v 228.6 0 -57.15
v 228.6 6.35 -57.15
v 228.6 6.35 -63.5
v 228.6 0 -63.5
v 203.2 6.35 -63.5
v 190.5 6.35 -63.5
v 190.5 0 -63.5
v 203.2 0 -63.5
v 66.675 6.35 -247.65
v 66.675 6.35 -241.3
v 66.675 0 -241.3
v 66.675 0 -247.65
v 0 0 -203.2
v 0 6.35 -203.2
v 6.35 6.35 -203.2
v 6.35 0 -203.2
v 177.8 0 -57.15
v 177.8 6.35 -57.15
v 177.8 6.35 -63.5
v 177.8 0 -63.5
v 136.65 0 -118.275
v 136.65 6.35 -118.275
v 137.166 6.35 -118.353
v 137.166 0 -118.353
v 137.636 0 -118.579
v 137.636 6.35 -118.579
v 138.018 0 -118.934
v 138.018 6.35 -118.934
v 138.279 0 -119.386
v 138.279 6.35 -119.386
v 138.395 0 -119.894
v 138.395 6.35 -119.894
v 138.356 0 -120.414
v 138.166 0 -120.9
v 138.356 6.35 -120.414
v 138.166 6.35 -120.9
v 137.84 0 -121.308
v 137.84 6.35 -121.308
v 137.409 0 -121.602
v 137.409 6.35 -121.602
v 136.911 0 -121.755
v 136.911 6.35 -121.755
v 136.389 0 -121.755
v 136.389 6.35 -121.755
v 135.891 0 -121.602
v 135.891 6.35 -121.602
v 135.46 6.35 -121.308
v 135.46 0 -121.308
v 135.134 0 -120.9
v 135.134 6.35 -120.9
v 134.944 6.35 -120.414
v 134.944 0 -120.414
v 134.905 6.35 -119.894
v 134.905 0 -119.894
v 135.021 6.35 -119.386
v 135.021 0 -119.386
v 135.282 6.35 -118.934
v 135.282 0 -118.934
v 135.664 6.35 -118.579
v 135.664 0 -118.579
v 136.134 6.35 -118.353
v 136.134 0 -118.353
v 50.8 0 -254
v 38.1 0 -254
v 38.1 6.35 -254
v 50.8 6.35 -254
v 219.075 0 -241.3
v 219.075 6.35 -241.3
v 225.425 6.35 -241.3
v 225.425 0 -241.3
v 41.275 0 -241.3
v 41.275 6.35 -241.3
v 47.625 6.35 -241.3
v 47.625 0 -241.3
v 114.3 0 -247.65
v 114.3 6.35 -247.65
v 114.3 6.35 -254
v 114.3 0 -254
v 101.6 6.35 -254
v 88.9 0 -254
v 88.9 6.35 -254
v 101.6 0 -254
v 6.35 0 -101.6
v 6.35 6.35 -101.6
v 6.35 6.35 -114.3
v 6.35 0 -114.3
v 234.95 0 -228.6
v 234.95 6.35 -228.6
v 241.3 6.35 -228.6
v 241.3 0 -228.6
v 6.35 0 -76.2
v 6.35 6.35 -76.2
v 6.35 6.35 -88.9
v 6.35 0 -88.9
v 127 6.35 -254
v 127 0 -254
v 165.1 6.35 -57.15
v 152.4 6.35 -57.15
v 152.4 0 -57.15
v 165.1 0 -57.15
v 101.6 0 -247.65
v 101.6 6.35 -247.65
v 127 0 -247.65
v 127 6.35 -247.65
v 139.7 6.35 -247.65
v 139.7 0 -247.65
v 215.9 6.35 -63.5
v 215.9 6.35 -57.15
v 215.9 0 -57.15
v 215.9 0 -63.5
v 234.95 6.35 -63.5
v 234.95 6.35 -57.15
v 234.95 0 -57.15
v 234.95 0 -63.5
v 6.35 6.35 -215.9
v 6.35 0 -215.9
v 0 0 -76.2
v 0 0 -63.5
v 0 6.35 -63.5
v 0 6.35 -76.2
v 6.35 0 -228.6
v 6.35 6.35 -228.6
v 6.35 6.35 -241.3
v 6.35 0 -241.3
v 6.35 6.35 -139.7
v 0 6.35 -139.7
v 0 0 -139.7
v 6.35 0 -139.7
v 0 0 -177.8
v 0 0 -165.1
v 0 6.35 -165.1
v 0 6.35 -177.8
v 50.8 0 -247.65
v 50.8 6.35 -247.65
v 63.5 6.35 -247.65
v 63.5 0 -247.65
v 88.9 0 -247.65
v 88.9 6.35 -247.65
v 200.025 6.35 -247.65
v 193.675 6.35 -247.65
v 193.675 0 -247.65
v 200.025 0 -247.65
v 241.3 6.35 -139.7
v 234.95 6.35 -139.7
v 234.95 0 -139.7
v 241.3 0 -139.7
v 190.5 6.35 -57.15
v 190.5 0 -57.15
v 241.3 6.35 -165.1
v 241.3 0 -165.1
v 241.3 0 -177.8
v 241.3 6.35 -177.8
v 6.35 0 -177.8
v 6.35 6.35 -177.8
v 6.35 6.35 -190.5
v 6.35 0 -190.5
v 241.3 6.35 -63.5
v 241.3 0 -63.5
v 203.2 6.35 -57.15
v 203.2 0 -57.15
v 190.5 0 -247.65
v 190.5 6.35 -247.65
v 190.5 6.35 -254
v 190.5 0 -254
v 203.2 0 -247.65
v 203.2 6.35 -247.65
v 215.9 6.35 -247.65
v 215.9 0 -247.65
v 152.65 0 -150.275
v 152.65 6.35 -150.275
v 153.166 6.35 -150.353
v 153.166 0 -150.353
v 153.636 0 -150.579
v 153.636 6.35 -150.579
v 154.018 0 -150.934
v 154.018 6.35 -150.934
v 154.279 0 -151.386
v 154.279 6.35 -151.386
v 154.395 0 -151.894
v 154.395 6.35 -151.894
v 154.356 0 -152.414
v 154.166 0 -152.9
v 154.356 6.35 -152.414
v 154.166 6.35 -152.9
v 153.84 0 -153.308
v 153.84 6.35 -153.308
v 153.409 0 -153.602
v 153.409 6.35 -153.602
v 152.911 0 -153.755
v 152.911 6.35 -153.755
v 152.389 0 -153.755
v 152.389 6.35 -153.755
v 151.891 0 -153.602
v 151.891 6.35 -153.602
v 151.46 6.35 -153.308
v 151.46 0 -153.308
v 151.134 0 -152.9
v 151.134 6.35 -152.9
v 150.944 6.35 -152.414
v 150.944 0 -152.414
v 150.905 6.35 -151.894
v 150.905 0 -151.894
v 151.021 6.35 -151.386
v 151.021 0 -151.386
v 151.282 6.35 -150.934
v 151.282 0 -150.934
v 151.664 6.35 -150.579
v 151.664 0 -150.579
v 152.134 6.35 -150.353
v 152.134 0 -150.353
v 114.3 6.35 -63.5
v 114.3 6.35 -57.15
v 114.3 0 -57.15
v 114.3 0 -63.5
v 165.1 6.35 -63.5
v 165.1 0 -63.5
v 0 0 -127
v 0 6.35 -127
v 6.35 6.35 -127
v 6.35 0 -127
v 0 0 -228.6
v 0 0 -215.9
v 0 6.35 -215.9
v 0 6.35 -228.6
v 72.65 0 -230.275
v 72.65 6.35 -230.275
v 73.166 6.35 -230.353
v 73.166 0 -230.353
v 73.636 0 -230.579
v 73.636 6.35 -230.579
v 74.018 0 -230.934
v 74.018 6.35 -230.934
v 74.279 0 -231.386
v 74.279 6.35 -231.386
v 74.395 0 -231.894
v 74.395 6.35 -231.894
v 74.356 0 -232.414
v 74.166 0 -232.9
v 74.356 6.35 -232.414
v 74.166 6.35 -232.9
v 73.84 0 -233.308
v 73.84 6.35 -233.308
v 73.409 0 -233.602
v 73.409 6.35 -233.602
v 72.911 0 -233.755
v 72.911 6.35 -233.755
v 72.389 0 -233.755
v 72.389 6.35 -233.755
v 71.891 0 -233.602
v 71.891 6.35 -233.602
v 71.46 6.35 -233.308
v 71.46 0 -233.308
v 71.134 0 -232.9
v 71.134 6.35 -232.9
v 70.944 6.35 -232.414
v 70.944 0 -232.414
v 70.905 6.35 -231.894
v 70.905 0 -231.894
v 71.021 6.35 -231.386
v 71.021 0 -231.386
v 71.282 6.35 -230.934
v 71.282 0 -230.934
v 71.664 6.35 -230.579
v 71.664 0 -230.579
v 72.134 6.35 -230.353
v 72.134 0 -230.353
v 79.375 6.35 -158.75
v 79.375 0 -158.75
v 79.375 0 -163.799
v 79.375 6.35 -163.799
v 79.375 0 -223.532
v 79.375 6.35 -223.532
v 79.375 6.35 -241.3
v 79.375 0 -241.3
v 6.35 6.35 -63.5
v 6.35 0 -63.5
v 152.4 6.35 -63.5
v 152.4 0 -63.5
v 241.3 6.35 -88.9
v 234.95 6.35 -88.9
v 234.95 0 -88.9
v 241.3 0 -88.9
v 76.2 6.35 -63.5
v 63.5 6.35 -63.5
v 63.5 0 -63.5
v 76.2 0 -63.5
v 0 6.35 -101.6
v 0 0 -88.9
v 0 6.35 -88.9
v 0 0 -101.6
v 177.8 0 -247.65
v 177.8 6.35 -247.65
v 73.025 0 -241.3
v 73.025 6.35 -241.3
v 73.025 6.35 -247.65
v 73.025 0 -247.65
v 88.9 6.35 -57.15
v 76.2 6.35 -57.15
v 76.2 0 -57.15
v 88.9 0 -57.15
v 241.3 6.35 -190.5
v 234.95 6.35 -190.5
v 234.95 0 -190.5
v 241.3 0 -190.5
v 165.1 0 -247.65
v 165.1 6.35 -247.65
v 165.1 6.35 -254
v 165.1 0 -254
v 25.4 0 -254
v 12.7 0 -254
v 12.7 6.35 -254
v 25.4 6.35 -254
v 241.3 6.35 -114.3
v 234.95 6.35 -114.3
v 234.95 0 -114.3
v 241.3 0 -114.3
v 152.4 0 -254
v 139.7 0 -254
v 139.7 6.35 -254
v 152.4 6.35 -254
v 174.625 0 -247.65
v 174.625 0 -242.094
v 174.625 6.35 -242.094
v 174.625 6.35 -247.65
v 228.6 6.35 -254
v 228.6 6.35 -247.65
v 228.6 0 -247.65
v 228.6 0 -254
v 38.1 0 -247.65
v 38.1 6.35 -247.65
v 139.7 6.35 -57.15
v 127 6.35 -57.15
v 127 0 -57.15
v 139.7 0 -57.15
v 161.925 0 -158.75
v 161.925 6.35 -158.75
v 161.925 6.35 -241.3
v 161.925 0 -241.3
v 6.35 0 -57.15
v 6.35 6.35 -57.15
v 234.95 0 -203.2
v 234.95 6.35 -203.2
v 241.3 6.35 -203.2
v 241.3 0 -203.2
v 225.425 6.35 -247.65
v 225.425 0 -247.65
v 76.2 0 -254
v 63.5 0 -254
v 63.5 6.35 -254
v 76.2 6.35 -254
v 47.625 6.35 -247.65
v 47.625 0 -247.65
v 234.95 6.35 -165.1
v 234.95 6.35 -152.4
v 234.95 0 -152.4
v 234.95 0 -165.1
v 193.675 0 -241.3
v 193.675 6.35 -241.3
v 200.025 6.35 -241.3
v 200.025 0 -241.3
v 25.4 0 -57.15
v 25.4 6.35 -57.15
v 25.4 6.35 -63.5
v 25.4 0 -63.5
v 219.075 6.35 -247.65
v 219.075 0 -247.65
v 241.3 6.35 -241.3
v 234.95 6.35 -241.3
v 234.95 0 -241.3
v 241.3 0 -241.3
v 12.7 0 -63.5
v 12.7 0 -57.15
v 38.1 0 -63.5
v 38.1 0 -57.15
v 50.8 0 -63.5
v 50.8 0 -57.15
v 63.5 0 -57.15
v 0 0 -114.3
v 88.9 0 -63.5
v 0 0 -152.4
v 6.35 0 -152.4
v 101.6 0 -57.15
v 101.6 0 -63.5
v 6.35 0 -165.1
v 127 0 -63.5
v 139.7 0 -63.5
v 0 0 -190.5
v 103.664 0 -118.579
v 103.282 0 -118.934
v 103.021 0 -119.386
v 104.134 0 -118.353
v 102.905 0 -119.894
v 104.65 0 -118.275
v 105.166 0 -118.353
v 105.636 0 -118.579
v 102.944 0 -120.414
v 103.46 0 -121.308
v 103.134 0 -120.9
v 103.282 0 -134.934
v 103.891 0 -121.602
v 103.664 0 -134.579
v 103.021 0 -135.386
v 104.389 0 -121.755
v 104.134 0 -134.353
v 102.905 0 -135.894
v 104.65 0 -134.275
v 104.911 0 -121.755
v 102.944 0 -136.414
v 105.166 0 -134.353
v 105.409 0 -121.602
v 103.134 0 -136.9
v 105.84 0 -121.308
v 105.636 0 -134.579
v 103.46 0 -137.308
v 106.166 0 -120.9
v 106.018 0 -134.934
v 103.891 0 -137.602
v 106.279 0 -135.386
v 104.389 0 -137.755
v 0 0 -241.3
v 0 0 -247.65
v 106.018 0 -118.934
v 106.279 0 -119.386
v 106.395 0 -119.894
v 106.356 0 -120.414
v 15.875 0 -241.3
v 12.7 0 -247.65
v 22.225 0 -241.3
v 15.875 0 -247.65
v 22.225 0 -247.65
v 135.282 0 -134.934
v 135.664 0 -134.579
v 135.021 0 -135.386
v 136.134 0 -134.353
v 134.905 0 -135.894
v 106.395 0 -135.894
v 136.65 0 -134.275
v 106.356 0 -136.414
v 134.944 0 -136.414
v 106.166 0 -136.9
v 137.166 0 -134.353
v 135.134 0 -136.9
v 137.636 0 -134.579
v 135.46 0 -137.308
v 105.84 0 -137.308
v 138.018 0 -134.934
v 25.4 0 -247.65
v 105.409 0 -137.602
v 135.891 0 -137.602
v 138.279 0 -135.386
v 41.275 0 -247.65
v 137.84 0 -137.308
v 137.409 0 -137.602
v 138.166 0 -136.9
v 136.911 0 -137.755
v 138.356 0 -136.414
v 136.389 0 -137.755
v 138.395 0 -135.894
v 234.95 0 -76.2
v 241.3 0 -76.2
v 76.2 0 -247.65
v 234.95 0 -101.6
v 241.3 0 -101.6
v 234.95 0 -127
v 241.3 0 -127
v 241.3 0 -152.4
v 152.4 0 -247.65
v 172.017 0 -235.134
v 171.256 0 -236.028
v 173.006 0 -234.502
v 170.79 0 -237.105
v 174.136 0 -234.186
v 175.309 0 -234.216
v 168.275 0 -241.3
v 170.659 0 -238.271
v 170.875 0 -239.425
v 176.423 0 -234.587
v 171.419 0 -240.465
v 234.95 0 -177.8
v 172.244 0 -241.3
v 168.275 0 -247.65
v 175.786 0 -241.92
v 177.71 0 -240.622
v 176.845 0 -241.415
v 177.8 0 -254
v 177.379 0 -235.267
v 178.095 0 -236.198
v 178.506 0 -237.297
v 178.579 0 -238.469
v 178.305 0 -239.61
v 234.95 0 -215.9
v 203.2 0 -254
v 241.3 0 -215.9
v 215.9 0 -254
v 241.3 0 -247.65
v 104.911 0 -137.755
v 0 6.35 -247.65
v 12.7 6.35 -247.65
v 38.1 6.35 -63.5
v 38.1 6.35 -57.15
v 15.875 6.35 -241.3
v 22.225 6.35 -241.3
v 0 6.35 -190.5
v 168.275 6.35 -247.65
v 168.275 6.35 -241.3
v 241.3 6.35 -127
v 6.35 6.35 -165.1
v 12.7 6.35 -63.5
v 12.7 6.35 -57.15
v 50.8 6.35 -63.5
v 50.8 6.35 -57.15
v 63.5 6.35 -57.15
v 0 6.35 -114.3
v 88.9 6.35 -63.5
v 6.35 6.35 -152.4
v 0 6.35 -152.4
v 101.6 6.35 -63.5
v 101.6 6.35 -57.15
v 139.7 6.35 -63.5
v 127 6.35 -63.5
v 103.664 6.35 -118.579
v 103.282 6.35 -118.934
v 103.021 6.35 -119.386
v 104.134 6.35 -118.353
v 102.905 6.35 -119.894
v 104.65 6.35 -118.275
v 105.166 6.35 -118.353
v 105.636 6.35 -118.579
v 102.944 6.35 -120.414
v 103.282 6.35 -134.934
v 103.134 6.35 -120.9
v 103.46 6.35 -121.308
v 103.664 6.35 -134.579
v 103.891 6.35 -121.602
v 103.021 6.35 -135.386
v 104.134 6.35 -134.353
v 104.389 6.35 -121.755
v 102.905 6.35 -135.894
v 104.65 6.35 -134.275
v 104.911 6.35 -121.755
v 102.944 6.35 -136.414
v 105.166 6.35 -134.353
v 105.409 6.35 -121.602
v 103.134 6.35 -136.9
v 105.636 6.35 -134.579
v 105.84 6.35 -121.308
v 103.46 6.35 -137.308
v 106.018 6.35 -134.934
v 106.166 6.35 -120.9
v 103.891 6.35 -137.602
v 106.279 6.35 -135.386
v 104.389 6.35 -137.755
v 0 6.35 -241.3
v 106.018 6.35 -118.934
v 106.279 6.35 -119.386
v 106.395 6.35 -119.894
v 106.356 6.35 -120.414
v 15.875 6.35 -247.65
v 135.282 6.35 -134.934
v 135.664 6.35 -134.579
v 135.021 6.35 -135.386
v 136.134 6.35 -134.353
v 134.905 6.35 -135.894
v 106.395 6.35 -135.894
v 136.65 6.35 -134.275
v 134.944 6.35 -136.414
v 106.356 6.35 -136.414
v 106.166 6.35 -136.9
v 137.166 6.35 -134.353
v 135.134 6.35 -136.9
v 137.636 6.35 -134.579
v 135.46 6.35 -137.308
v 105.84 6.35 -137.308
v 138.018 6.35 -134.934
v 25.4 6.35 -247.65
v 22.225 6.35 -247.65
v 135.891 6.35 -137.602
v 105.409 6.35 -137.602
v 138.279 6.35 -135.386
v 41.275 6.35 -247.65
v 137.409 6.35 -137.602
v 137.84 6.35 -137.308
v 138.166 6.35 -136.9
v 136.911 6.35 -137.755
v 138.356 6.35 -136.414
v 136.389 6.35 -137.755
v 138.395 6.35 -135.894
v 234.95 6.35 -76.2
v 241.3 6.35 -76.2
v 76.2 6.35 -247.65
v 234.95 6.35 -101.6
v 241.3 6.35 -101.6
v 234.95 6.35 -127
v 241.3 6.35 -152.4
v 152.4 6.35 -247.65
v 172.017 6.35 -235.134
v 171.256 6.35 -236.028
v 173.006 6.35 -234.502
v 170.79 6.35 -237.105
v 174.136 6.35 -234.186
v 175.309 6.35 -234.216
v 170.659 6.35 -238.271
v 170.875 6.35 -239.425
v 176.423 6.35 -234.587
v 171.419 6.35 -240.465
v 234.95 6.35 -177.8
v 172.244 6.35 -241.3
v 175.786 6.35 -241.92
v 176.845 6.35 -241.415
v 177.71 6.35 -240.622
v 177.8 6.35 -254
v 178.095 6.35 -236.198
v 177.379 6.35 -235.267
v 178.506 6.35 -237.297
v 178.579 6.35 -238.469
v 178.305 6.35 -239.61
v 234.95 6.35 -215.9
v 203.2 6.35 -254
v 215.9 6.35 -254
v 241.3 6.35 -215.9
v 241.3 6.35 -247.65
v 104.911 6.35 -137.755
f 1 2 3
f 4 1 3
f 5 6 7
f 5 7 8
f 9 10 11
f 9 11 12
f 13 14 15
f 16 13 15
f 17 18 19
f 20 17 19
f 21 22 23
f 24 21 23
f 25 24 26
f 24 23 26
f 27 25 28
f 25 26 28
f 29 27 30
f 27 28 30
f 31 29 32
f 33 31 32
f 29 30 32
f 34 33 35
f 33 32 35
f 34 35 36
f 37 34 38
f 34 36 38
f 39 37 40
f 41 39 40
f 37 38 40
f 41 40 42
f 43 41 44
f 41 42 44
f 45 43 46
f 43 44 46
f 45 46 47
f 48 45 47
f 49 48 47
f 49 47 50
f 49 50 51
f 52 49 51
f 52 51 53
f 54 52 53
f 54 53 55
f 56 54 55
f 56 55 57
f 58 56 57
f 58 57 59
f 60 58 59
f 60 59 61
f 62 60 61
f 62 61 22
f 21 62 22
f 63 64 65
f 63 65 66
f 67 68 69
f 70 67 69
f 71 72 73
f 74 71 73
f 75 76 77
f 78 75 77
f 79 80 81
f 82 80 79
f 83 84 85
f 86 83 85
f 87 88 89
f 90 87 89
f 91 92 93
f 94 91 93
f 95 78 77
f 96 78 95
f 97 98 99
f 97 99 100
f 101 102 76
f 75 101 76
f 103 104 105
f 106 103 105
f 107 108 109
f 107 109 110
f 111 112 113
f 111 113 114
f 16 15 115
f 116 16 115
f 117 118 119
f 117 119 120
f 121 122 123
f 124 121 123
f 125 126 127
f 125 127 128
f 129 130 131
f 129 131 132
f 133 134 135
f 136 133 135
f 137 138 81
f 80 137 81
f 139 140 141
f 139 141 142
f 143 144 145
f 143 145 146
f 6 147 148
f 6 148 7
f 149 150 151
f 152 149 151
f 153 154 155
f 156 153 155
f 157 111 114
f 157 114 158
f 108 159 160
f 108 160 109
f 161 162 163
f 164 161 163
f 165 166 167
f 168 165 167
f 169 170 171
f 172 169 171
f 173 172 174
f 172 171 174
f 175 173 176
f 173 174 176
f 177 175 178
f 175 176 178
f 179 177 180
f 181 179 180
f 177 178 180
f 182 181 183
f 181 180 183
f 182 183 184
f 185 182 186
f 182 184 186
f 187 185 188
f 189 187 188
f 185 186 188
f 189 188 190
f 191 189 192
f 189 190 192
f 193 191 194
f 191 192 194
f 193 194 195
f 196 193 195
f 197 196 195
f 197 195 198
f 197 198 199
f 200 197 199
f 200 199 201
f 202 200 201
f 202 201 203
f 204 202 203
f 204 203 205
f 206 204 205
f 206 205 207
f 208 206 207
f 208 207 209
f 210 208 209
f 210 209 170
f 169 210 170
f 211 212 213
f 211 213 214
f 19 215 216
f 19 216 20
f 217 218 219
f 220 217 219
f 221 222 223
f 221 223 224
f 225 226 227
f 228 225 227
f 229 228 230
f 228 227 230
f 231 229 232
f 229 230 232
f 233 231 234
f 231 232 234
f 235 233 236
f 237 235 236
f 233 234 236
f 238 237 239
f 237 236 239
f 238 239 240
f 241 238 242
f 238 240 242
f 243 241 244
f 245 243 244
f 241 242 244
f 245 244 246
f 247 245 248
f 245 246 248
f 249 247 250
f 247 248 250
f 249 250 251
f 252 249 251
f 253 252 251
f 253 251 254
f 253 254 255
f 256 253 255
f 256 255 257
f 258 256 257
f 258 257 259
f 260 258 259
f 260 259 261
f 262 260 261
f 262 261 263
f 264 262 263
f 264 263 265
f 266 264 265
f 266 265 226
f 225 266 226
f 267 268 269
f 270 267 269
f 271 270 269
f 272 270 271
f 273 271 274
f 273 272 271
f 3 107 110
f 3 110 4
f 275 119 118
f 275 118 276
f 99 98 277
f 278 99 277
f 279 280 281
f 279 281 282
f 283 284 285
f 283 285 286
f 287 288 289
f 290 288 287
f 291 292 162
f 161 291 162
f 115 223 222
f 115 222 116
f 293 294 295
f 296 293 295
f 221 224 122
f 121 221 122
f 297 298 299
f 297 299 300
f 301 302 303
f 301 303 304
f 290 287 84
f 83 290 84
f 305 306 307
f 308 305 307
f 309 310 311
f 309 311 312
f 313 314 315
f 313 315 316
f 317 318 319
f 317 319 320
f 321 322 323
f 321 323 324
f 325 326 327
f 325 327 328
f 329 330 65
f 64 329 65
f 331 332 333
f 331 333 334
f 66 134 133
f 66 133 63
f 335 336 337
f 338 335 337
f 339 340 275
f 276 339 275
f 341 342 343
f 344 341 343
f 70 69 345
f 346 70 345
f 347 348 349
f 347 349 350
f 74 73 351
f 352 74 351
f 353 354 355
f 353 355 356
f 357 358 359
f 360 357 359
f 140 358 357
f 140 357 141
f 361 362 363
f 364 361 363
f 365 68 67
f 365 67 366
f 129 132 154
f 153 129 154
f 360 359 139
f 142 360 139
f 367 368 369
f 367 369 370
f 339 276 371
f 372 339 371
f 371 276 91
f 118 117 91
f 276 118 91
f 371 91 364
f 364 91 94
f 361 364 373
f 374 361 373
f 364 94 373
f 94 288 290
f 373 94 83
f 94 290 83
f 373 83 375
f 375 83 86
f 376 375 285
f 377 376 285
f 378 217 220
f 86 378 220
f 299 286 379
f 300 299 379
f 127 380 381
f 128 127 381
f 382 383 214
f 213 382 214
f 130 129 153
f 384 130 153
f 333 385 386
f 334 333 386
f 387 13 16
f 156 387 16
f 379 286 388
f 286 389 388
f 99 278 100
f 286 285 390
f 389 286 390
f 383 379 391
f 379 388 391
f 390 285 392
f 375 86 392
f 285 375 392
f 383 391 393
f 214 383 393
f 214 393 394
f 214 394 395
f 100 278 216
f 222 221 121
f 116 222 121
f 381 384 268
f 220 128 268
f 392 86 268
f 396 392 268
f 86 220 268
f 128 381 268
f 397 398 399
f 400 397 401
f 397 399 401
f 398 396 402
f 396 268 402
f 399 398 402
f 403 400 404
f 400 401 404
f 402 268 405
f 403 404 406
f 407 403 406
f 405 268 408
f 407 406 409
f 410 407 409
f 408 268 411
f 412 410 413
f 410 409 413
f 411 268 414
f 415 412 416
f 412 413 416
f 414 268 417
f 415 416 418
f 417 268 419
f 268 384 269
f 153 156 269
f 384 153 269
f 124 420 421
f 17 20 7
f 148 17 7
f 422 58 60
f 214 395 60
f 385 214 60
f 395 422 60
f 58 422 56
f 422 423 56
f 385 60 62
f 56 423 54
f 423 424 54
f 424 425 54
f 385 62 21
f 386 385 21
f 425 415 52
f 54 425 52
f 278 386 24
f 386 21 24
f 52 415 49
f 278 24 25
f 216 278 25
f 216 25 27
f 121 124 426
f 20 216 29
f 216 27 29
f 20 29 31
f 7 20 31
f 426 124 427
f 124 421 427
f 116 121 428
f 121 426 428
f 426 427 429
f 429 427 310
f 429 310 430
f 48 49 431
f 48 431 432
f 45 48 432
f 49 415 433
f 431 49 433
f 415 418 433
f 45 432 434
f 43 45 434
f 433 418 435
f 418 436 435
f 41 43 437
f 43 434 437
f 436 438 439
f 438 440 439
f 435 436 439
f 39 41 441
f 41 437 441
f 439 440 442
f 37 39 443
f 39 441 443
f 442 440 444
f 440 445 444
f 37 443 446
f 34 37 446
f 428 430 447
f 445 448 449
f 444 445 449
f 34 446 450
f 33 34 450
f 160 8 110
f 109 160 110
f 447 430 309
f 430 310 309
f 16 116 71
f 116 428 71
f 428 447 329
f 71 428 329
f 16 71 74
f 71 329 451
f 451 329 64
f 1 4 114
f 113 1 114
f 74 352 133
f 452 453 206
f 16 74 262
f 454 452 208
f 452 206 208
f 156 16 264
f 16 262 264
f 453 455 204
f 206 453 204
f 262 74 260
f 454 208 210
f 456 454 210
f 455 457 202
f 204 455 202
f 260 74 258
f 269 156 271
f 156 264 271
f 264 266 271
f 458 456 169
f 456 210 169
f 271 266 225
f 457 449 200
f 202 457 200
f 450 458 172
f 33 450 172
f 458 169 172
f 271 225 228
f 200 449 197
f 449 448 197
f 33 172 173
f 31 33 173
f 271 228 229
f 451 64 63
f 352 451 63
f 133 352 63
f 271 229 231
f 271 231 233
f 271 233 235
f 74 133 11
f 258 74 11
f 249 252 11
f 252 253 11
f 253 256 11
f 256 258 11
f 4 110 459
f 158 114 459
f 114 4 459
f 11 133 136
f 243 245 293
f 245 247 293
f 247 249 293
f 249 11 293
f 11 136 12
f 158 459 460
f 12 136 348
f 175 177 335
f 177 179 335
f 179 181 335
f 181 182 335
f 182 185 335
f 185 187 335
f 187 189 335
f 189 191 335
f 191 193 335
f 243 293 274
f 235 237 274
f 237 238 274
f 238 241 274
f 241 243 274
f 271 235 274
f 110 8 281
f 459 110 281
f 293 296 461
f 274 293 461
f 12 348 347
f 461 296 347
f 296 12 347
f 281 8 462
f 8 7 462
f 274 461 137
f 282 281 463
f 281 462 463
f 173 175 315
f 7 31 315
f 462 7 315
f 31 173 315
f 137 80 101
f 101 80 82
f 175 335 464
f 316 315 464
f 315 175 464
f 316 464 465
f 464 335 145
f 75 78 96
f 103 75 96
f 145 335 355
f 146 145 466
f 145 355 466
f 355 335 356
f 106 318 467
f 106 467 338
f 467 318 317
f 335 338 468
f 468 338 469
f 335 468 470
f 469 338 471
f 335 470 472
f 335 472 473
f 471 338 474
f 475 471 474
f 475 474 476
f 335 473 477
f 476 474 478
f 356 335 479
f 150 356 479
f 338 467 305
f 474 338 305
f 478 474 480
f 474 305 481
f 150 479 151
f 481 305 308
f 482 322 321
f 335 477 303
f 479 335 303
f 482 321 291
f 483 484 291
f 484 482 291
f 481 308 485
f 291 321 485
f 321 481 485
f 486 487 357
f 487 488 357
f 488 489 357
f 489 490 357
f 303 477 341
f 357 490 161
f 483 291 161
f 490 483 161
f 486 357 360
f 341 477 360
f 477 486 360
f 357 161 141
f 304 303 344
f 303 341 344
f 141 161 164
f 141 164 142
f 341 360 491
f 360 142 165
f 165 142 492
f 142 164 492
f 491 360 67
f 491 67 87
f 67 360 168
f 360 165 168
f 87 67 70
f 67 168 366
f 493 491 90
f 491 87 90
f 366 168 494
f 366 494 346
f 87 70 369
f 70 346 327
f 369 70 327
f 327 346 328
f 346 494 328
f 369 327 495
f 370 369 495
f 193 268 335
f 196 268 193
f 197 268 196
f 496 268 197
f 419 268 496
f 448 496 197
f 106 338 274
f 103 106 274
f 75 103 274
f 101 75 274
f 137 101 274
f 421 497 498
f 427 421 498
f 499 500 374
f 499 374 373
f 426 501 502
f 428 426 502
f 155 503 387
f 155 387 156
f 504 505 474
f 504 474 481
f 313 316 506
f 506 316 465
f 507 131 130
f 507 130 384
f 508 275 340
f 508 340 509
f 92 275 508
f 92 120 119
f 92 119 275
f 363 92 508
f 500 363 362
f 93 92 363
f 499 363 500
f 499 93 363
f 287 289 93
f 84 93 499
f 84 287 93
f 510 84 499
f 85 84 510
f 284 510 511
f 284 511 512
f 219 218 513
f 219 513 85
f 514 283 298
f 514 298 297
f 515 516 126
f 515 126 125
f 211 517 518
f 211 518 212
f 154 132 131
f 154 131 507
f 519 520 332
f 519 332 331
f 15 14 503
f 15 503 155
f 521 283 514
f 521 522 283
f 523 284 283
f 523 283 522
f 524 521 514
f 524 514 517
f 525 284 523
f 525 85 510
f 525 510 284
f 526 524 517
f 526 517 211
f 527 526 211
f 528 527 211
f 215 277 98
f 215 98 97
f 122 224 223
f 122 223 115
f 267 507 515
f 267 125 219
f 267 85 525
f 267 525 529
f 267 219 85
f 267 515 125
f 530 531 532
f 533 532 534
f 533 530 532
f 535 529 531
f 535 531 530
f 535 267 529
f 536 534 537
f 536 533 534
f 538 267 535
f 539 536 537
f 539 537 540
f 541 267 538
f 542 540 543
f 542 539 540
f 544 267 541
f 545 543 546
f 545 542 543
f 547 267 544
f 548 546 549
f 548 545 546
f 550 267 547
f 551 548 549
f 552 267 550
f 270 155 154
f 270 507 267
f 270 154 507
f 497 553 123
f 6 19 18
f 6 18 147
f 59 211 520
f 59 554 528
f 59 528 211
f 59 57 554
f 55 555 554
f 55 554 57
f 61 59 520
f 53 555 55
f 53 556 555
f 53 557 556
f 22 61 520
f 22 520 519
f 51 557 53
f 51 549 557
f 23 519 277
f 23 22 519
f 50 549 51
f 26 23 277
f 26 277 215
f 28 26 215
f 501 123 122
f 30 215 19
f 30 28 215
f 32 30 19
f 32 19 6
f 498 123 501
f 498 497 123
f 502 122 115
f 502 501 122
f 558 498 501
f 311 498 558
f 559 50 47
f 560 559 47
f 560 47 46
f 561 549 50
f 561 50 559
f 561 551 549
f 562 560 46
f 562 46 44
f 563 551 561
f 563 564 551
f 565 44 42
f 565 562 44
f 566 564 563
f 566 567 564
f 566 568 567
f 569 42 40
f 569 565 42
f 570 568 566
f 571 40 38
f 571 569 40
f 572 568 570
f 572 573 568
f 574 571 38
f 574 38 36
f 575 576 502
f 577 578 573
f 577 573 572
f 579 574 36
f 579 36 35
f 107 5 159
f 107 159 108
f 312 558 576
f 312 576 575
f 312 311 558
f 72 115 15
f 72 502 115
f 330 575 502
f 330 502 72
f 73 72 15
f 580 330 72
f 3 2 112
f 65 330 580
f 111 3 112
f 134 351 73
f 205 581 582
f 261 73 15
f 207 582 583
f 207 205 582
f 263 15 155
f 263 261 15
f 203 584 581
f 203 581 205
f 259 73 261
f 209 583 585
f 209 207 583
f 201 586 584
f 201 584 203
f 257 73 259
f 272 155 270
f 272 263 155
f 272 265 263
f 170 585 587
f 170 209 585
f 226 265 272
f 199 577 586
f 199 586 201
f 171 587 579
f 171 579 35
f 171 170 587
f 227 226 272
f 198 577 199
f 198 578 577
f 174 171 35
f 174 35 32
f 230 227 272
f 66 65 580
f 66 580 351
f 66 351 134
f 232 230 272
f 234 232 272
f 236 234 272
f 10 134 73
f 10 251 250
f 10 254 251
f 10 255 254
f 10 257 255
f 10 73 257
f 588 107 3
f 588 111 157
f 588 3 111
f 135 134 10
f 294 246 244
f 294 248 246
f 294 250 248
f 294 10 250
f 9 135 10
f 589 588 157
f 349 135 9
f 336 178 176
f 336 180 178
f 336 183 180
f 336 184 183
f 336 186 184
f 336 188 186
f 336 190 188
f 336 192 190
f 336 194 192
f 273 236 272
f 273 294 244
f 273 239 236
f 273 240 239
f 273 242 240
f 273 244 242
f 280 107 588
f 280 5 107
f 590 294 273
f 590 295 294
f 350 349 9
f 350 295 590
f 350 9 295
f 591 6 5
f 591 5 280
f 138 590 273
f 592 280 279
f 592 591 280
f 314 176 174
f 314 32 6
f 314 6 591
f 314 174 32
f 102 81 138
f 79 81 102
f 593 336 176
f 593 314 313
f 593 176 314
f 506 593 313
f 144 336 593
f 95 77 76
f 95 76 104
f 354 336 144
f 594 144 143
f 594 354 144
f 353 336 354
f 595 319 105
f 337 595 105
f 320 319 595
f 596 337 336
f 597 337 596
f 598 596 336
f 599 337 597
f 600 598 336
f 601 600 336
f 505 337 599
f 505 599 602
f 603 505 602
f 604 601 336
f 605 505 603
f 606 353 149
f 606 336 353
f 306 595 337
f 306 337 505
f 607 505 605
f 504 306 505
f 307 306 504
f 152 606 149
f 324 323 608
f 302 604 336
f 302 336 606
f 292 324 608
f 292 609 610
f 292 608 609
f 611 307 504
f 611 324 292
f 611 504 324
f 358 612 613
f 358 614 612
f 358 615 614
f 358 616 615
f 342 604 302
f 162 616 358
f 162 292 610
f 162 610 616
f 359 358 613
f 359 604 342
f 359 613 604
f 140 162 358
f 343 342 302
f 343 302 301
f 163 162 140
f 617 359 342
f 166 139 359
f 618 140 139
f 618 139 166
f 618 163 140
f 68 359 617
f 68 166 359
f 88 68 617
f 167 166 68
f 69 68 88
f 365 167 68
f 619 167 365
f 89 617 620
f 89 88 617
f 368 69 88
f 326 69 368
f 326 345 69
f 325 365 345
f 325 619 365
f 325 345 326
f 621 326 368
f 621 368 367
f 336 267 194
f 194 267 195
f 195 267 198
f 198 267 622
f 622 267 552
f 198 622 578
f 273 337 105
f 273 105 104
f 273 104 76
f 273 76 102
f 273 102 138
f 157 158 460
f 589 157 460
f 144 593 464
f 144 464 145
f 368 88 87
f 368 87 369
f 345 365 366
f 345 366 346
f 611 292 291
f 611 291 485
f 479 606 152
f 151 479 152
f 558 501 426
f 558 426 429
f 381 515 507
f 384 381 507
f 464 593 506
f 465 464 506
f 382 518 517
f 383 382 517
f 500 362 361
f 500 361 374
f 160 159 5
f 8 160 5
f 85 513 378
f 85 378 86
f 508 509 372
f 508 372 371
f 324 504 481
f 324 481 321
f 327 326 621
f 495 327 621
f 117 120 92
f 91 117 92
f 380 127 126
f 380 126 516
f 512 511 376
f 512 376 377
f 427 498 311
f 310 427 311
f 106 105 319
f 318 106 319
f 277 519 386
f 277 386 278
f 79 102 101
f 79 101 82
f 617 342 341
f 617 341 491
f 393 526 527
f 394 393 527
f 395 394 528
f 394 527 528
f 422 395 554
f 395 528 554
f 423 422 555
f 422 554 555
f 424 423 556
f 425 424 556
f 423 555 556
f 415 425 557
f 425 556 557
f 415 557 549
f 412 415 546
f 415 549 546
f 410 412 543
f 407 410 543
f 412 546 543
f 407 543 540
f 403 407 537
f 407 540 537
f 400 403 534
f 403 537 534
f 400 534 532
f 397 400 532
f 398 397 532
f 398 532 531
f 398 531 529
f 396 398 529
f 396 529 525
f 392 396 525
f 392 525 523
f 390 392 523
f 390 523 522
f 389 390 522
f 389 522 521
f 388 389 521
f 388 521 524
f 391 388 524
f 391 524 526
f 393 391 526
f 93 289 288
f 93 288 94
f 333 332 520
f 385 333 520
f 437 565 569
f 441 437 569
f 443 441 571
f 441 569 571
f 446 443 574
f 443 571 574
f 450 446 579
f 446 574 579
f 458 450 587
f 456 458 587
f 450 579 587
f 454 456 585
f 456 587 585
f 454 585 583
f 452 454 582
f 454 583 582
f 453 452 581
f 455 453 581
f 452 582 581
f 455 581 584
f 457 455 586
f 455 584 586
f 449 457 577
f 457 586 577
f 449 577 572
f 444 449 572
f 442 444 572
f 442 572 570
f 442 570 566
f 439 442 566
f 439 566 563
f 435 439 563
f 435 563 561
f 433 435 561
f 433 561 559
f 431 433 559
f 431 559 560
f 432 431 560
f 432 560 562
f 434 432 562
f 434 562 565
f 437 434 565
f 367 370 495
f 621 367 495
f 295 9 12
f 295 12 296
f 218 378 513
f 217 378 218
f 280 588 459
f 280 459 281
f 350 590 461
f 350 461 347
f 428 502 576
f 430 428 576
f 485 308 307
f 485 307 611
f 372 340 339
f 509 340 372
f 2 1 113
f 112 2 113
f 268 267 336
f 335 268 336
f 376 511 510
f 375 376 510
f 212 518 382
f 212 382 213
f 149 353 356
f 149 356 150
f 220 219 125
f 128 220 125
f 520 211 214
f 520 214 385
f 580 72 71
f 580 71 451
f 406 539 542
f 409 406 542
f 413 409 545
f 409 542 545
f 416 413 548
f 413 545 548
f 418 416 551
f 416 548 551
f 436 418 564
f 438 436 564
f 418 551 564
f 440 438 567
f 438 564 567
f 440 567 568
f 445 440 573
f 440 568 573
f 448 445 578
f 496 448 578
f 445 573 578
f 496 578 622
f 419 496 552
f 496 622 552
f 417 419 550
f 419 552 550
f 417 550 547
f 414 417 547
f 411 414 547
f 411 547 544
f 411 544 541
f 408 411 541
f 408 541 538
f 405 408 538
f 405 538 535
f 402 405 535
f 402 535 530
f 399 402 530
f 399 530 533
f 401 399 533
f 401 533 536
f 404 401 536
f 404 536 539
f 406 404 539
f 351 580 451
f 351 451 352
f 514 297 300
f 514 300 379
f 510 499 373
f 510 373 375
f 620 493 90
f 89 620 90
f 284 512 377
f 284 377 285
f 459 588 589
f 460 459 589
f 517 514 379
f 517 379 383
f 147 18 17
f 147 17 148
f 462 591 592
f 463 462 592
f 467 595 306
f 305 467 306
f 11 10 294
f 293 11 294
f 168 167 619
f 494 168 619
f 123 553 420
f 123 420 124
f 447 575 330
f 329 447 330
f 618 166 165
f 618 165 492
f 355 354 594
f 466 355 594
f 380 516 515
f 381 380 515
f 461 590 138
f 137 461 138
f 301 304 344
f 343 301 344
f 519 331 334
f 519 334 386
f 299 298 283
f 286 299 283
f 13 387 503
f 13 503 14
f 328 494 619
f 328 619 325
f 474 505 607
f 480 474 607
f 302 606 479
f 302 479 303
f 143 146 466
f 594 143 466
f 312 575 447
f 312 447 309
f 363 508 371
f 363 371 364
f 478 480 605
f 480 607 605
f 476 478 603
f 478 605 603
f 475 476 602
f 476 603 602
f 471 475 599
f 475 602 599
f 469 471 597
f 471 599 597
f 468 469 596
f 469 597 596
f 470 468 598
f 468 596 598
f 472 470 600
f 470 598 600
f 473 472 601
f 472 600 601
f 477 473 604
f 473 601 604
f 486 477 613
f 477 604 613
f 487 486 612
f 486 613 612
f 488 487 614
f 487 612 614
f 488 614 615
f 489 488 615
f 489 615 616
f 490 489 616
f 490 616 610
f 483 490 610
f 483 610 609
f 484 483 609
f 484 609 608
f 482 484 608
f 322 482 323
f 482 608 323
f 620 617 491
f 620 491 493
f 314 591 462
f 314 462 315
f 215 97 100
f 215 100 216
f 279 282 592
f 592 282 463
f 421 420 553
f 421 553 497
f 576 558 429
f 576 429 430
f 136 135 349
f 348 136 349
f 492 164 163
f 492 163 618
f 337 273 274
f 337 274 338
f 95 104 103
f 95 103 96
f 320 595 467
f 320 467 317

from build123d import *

# Parameters (mm, degrees)
SKETCH1_W            = 241.3
SKETCH1_H            = 254
BOSS_EXTRUDE1_DEPTH  = 6.35
SKETCH2_W            = 6.35
SKETCH2_H            = 12.7
CUT_EXTRUDE1_DEPTH   = 351.402643398
LPATTERN1_COUNT      = 10
LPATTERN1_PITCH      = 25.4
SKETCH3_W            = 12.7
SKETCH3_H            = 6.35
CUT_EXTRUDE2_DEPTH   = 351.402643398
LPATTERN2_COUNT      = 10
LPATTERN2_PITCH      = 25.4
SKETCH4_W            = 241.3
SKETCH4_H            = 57.15
CUT_EXTRUDE3_DEPTH   = 351.402643398
SKETCH5_W            = 12.7
SKETCH5_H            = 6.35
CUT_EXTRUDE4_DEPTH   = 351.402643398
LPATTERN3_COUNT      = 10
LPATTERN3_PITCH      = 25.4
SKETCH6_W            = 82.55
SKETCH6_H            = 82.55
CUT_EXTRUDE5_DEPTH   = 351.402643398
SKETCH7_W            = 6.35
SKETCH7_H            = 6.35
CUT_EXTRUDE6_DEPTH   = 351.402643398
LPATTERN4_COUNT      = 9
LPATTERN4_PITCH      = 25.4
SKETCH8_R            = 1.75
CUT_EXTRUDE7_DEPTH   = 351.402643398
LPATTERN5_COUNT      = 13
LPATTERN5_PITCH      = 16
LPATTERN5_COUNT_DIR2 = 11
LPATTERN5_PITCH_DIR2 = 16
SKETCH9_W            = 48.045746174
SKETCH9_H            = 167.078000208
SKETCH9_W_2          = 46.314367934
SKETCH9_W_3          = 108.643984591
SKETCH9_H_2          = 41.120233212
SKETCH9_W_4          = 31.284165216
SKETCH9_H_3          = 8.622263637
SKETCH9_W_5          = 25.970673607
SKETCH9_H_4          = 10.388269443
SKETCH9_W_6          = 15.149559605
SKETCH9_W_7          = 30.731963769
SKETCH9_W_8          = 73.583575221
SKETCH9_H_5          = 8.656891202
SKETCH9_W_9          = 14.283870484
SKETCH9_W_10         = 8.224046642
SKETCH9_H_6          = 72.285041541
SKETCH9_W_11         = 11.748458615
SKETCH9_H_7          = 59.732549298
SKETCH9_W_12         = 9.178793531
SKETCH9_W_13         = 27.063281488
BOSS_EXTRUDE2_DEPTH  = 6.35
SKETCH10_R           = 3.96875
CUT_EXTRUDE8_DEPTH   = 351.402643398


with BuildPart() as part:
    # Sketch1 → Boss-Extrude1 (new body)
    with BuildSketch(Plane(origin=(0, 0, 0), x_dir=(1, 0, 0), z_dir=(0, 1, 0))):
        with Locations((120.65, 127)):
            Rectangle(SKETCH1_W, SKETCH1_H)
    extrude(amount=BOSS_EXTRUDE1_DEPTH)

    # Sketch2 → Cut-Extrude1 (cut, through all)
    with BuildSketch(Plane(origin=(0, 6.35, 0), x_dir=(1, 0, 0), z_dir=(0, 1, 0))):
        with Locations((3.175, 6.35)):
            Rectangle(SKETCH2_W, SKETCH2_H)
        with Locations((238.125, 6.35)):
            Rectangle(SKETCH2_W, SKETCH2_H)
    cut_extrude1 = extrude(amount=-CUT_EXTRUDE1_DEPTH, mode=Mode.SUBTRACT)

    # LPattern1: Cut-Extrude1 ×10
    with Locations(*[(0, 0, -i * LPATTERN1_PITCH) for i in range(1, LPATTERN1_COUNT)]):
        add(cut_extrude1, mode=Mode.SUBTRACT)

    # Sketch3 → Cut-Extrude2 (cut, through all)
    with BuildSketch(Plane(origin=(0, 6.35, 0), x_dir=(1, 0, 0), z_dir=(0, 1, 0))):
        with Locations((6.35, 3.175)):
            Rectangle(SKETCH3_W, SKETCH3_H)
        with Locations((6.35, 250.825)):
            Rectangle(SKETCH3_W, SKETCH3_H)
    cut_extrude2 = extrude(amount=-CUT_EXTRUDE2_DEPTH, mode=Mode.SUBTRACT)

    # LPattern2: Cut-Extrude2 ×10
    with Locations(*[(i * LPATTERN2_PITCH, 0, 0) for i in range(1, LPATTERN2_COUNT)]):
        add(cut_extrude2, mode=Mode.SUBTRACT)

    # Sketch4 → Cut-Extrude3 (cut, through all)
    with BuildSketch(Plane(origin=(0, 6.35, 0), x_dir=(1, 0, 0), z_dir=(0, 1, 0))):
        with Locations((120.65, 28.575)):
            Rectangle(SKETCH4_W, SKETCH4_H)
    extrude(amount=-CUT_EXTRUDE3_DEPTH, mode=Mode.SUBTRACT)

    # Sketch5 → Cut-Extrude4 (cut, through all)
    with BuildSketch(Plane(origin=(0, 6.35, 0), x_dir=(1, 0, 0), z_dir=(0, 1, 0))):
        with Locations((19.05, 60.325)):
            Rectangle(SKETCH5_W, SKETCH5_H)
    cut_extrude4 = extrude(amount=-CUT_EXTRUDE4_DEPTH, mode=Mode.SUBTRACT)

    # LPattern3: Cut-Extrude4 ×10
    with Locations(*[(i * LPATTERN3_PITCH, 0, 0) for i in range(1, LPATTERN3_COUNT)]):
        add(cut_extrude4, mode=Mode.SUBTRACT)

    # Sketch6 → Cut-Extrude5 (cut, through all)
    with BuildSketch(Plane(origin=(0, 6.35, 0), x_dir=(1, 0, 0), z_dir=(0, 1, 0))):
        with Locations((120.65, 200.025)):
            Rectangle(SKETCH6_W, SKETCH6_H)
    extrude(amount=-CUT_EXTRUDE5_DEPTH, mode=Mode.SUBTRACT)

    # Sketch7 → Cut-Extrude6 (cut, through all)
    with BuildSketch(Plane(origin=(0, 6.35, 0), x_dir=(1, 0, 0), z_dir=(0, 1, 0))):
        with Locations((19.05, 244.475)):
            Rectangle(SKETCH7_W, SKETCH7_H)
    cut_extrude6 = extrude(amount=-CUT_EXTRUDE6_DEPTH, mode=Mode.SUBTRACT)

    # LPattern4: Cut-Extrude6 ×9, 3 skipped
    with Locations(*[(i * LPATTERN4_PITCH, 0, 0) for i in range(1, LPATTERN4_COUNT) if i not in (3, 4, 5)]):
        add(cut_extrude6, mode=Mode.SUBTRACT)

    # Sketch8 → Cut-Extrude7 (cut, through all)
    with BuildSketch(Plane(origin=(0, 6.35, 0), x_dir=(1, 0, 0), z_dir=(0, 1, 0))):
        with Locations(Location((24.65, 72.025, 0), (0, 0, 270))):
            Circle(SKETCH8_R)
    cut_extrude7 = extrude(amount=-CUT_EXTRUDE7_DEPTH, mode=Mode.SUBTRACT)

    # LPattern5: Cut-Extrude7 13 × 11
    with Locations(*[(i * LPATTERN5_PITCH, 0, -j * LPATTERN5_PITCH_DIR2) for i in range(LPATTERN5_COUNT) for j in range(LPATTERN5_COUNT_DIR2) if (i, j) != (0, 0)]):
        add(cut_extrude7, mode=Mode.SUBTRACT)

    # Sketch9 → Boss-Extrude2 (add, through all)
    with BuildSketch(Plane(origin=(0, 6.35, 0), x_dir=(1, 0, 0), z_dir=(0, 1, 0))):
        with Locations((38.409533576, 152.545088079)):
            Rectangle(SKETCH9_W, SKETCH9_H)
        with Locations((203.756155544, 152.545088079)):
            Rectangle(SKETCH9_W_2, SKETCH9_H)
        with Locations((121.948533681, 89.566204581)):
            Rectangle(SKETCH9_W_3, SKETCH9_H_2)
        with Locations((83.268623993, 135.798764893)):
            Rectangle(SKETCH9_W_4, SKETCH9_H_3)
        with Locations((80.611878189, 120.51459063)):
            Rectangle(SKETCH9_W_5, SKETCH9_H_4)
        with Locations((122.814222801, 120.51459063)):
            Rectangle(SKETCH9_W_6, SKETCH9_H_4)
        with Locations((160.904544092, 120.51459063)):
            Rectangle(SKETCH9_W_7, SKETCH9_H_4)
        with Locations((104.418328996, 151.679398959)):
            Rectangle(SKETCH9_W_8, SKETCH9_H_5)
        with Locations((169.128590734, 151.679398959)):
            Rectangle(SKETCH9_W_9, SKETCH9_H_5)
        with Locations((169.128590734, 199.941567413)):
            Rectangle(SKETCH9_W_10, SKETCH9_H_6)
        with Locations((73.500770692, 193.665321291)):
            Rectangle(SKETCH9_W_11, SKETCH9_H_7)
        with Locations((119.828839764, 135.798764893)):
            Rectangle(SKETCH9_W_12, SKETCH9_H_3)
        with Locations((162.738885232, 135.798764893)):
            Rectangle(SKETCH9_W_13, SKETCH9_H_3)
    extrude(amount=-BOSS_EXTRUDE2_DEPTH)

    # Sketch10 → Cut-Extrude8 (cut, through all)
    with BuildSketch(Plane(origin=(0, 6.35, 0), x_dir=(1, 0, 0), z_dir=(0, 1, 0))):
        with Locations((174.625, 238.125)):
            Circle(SKETCH10_R)
    extrude(amount=-CUT_EXTRUDE8_DEPTH, mode=Mode.SUBTRACT)


solid = part.part
